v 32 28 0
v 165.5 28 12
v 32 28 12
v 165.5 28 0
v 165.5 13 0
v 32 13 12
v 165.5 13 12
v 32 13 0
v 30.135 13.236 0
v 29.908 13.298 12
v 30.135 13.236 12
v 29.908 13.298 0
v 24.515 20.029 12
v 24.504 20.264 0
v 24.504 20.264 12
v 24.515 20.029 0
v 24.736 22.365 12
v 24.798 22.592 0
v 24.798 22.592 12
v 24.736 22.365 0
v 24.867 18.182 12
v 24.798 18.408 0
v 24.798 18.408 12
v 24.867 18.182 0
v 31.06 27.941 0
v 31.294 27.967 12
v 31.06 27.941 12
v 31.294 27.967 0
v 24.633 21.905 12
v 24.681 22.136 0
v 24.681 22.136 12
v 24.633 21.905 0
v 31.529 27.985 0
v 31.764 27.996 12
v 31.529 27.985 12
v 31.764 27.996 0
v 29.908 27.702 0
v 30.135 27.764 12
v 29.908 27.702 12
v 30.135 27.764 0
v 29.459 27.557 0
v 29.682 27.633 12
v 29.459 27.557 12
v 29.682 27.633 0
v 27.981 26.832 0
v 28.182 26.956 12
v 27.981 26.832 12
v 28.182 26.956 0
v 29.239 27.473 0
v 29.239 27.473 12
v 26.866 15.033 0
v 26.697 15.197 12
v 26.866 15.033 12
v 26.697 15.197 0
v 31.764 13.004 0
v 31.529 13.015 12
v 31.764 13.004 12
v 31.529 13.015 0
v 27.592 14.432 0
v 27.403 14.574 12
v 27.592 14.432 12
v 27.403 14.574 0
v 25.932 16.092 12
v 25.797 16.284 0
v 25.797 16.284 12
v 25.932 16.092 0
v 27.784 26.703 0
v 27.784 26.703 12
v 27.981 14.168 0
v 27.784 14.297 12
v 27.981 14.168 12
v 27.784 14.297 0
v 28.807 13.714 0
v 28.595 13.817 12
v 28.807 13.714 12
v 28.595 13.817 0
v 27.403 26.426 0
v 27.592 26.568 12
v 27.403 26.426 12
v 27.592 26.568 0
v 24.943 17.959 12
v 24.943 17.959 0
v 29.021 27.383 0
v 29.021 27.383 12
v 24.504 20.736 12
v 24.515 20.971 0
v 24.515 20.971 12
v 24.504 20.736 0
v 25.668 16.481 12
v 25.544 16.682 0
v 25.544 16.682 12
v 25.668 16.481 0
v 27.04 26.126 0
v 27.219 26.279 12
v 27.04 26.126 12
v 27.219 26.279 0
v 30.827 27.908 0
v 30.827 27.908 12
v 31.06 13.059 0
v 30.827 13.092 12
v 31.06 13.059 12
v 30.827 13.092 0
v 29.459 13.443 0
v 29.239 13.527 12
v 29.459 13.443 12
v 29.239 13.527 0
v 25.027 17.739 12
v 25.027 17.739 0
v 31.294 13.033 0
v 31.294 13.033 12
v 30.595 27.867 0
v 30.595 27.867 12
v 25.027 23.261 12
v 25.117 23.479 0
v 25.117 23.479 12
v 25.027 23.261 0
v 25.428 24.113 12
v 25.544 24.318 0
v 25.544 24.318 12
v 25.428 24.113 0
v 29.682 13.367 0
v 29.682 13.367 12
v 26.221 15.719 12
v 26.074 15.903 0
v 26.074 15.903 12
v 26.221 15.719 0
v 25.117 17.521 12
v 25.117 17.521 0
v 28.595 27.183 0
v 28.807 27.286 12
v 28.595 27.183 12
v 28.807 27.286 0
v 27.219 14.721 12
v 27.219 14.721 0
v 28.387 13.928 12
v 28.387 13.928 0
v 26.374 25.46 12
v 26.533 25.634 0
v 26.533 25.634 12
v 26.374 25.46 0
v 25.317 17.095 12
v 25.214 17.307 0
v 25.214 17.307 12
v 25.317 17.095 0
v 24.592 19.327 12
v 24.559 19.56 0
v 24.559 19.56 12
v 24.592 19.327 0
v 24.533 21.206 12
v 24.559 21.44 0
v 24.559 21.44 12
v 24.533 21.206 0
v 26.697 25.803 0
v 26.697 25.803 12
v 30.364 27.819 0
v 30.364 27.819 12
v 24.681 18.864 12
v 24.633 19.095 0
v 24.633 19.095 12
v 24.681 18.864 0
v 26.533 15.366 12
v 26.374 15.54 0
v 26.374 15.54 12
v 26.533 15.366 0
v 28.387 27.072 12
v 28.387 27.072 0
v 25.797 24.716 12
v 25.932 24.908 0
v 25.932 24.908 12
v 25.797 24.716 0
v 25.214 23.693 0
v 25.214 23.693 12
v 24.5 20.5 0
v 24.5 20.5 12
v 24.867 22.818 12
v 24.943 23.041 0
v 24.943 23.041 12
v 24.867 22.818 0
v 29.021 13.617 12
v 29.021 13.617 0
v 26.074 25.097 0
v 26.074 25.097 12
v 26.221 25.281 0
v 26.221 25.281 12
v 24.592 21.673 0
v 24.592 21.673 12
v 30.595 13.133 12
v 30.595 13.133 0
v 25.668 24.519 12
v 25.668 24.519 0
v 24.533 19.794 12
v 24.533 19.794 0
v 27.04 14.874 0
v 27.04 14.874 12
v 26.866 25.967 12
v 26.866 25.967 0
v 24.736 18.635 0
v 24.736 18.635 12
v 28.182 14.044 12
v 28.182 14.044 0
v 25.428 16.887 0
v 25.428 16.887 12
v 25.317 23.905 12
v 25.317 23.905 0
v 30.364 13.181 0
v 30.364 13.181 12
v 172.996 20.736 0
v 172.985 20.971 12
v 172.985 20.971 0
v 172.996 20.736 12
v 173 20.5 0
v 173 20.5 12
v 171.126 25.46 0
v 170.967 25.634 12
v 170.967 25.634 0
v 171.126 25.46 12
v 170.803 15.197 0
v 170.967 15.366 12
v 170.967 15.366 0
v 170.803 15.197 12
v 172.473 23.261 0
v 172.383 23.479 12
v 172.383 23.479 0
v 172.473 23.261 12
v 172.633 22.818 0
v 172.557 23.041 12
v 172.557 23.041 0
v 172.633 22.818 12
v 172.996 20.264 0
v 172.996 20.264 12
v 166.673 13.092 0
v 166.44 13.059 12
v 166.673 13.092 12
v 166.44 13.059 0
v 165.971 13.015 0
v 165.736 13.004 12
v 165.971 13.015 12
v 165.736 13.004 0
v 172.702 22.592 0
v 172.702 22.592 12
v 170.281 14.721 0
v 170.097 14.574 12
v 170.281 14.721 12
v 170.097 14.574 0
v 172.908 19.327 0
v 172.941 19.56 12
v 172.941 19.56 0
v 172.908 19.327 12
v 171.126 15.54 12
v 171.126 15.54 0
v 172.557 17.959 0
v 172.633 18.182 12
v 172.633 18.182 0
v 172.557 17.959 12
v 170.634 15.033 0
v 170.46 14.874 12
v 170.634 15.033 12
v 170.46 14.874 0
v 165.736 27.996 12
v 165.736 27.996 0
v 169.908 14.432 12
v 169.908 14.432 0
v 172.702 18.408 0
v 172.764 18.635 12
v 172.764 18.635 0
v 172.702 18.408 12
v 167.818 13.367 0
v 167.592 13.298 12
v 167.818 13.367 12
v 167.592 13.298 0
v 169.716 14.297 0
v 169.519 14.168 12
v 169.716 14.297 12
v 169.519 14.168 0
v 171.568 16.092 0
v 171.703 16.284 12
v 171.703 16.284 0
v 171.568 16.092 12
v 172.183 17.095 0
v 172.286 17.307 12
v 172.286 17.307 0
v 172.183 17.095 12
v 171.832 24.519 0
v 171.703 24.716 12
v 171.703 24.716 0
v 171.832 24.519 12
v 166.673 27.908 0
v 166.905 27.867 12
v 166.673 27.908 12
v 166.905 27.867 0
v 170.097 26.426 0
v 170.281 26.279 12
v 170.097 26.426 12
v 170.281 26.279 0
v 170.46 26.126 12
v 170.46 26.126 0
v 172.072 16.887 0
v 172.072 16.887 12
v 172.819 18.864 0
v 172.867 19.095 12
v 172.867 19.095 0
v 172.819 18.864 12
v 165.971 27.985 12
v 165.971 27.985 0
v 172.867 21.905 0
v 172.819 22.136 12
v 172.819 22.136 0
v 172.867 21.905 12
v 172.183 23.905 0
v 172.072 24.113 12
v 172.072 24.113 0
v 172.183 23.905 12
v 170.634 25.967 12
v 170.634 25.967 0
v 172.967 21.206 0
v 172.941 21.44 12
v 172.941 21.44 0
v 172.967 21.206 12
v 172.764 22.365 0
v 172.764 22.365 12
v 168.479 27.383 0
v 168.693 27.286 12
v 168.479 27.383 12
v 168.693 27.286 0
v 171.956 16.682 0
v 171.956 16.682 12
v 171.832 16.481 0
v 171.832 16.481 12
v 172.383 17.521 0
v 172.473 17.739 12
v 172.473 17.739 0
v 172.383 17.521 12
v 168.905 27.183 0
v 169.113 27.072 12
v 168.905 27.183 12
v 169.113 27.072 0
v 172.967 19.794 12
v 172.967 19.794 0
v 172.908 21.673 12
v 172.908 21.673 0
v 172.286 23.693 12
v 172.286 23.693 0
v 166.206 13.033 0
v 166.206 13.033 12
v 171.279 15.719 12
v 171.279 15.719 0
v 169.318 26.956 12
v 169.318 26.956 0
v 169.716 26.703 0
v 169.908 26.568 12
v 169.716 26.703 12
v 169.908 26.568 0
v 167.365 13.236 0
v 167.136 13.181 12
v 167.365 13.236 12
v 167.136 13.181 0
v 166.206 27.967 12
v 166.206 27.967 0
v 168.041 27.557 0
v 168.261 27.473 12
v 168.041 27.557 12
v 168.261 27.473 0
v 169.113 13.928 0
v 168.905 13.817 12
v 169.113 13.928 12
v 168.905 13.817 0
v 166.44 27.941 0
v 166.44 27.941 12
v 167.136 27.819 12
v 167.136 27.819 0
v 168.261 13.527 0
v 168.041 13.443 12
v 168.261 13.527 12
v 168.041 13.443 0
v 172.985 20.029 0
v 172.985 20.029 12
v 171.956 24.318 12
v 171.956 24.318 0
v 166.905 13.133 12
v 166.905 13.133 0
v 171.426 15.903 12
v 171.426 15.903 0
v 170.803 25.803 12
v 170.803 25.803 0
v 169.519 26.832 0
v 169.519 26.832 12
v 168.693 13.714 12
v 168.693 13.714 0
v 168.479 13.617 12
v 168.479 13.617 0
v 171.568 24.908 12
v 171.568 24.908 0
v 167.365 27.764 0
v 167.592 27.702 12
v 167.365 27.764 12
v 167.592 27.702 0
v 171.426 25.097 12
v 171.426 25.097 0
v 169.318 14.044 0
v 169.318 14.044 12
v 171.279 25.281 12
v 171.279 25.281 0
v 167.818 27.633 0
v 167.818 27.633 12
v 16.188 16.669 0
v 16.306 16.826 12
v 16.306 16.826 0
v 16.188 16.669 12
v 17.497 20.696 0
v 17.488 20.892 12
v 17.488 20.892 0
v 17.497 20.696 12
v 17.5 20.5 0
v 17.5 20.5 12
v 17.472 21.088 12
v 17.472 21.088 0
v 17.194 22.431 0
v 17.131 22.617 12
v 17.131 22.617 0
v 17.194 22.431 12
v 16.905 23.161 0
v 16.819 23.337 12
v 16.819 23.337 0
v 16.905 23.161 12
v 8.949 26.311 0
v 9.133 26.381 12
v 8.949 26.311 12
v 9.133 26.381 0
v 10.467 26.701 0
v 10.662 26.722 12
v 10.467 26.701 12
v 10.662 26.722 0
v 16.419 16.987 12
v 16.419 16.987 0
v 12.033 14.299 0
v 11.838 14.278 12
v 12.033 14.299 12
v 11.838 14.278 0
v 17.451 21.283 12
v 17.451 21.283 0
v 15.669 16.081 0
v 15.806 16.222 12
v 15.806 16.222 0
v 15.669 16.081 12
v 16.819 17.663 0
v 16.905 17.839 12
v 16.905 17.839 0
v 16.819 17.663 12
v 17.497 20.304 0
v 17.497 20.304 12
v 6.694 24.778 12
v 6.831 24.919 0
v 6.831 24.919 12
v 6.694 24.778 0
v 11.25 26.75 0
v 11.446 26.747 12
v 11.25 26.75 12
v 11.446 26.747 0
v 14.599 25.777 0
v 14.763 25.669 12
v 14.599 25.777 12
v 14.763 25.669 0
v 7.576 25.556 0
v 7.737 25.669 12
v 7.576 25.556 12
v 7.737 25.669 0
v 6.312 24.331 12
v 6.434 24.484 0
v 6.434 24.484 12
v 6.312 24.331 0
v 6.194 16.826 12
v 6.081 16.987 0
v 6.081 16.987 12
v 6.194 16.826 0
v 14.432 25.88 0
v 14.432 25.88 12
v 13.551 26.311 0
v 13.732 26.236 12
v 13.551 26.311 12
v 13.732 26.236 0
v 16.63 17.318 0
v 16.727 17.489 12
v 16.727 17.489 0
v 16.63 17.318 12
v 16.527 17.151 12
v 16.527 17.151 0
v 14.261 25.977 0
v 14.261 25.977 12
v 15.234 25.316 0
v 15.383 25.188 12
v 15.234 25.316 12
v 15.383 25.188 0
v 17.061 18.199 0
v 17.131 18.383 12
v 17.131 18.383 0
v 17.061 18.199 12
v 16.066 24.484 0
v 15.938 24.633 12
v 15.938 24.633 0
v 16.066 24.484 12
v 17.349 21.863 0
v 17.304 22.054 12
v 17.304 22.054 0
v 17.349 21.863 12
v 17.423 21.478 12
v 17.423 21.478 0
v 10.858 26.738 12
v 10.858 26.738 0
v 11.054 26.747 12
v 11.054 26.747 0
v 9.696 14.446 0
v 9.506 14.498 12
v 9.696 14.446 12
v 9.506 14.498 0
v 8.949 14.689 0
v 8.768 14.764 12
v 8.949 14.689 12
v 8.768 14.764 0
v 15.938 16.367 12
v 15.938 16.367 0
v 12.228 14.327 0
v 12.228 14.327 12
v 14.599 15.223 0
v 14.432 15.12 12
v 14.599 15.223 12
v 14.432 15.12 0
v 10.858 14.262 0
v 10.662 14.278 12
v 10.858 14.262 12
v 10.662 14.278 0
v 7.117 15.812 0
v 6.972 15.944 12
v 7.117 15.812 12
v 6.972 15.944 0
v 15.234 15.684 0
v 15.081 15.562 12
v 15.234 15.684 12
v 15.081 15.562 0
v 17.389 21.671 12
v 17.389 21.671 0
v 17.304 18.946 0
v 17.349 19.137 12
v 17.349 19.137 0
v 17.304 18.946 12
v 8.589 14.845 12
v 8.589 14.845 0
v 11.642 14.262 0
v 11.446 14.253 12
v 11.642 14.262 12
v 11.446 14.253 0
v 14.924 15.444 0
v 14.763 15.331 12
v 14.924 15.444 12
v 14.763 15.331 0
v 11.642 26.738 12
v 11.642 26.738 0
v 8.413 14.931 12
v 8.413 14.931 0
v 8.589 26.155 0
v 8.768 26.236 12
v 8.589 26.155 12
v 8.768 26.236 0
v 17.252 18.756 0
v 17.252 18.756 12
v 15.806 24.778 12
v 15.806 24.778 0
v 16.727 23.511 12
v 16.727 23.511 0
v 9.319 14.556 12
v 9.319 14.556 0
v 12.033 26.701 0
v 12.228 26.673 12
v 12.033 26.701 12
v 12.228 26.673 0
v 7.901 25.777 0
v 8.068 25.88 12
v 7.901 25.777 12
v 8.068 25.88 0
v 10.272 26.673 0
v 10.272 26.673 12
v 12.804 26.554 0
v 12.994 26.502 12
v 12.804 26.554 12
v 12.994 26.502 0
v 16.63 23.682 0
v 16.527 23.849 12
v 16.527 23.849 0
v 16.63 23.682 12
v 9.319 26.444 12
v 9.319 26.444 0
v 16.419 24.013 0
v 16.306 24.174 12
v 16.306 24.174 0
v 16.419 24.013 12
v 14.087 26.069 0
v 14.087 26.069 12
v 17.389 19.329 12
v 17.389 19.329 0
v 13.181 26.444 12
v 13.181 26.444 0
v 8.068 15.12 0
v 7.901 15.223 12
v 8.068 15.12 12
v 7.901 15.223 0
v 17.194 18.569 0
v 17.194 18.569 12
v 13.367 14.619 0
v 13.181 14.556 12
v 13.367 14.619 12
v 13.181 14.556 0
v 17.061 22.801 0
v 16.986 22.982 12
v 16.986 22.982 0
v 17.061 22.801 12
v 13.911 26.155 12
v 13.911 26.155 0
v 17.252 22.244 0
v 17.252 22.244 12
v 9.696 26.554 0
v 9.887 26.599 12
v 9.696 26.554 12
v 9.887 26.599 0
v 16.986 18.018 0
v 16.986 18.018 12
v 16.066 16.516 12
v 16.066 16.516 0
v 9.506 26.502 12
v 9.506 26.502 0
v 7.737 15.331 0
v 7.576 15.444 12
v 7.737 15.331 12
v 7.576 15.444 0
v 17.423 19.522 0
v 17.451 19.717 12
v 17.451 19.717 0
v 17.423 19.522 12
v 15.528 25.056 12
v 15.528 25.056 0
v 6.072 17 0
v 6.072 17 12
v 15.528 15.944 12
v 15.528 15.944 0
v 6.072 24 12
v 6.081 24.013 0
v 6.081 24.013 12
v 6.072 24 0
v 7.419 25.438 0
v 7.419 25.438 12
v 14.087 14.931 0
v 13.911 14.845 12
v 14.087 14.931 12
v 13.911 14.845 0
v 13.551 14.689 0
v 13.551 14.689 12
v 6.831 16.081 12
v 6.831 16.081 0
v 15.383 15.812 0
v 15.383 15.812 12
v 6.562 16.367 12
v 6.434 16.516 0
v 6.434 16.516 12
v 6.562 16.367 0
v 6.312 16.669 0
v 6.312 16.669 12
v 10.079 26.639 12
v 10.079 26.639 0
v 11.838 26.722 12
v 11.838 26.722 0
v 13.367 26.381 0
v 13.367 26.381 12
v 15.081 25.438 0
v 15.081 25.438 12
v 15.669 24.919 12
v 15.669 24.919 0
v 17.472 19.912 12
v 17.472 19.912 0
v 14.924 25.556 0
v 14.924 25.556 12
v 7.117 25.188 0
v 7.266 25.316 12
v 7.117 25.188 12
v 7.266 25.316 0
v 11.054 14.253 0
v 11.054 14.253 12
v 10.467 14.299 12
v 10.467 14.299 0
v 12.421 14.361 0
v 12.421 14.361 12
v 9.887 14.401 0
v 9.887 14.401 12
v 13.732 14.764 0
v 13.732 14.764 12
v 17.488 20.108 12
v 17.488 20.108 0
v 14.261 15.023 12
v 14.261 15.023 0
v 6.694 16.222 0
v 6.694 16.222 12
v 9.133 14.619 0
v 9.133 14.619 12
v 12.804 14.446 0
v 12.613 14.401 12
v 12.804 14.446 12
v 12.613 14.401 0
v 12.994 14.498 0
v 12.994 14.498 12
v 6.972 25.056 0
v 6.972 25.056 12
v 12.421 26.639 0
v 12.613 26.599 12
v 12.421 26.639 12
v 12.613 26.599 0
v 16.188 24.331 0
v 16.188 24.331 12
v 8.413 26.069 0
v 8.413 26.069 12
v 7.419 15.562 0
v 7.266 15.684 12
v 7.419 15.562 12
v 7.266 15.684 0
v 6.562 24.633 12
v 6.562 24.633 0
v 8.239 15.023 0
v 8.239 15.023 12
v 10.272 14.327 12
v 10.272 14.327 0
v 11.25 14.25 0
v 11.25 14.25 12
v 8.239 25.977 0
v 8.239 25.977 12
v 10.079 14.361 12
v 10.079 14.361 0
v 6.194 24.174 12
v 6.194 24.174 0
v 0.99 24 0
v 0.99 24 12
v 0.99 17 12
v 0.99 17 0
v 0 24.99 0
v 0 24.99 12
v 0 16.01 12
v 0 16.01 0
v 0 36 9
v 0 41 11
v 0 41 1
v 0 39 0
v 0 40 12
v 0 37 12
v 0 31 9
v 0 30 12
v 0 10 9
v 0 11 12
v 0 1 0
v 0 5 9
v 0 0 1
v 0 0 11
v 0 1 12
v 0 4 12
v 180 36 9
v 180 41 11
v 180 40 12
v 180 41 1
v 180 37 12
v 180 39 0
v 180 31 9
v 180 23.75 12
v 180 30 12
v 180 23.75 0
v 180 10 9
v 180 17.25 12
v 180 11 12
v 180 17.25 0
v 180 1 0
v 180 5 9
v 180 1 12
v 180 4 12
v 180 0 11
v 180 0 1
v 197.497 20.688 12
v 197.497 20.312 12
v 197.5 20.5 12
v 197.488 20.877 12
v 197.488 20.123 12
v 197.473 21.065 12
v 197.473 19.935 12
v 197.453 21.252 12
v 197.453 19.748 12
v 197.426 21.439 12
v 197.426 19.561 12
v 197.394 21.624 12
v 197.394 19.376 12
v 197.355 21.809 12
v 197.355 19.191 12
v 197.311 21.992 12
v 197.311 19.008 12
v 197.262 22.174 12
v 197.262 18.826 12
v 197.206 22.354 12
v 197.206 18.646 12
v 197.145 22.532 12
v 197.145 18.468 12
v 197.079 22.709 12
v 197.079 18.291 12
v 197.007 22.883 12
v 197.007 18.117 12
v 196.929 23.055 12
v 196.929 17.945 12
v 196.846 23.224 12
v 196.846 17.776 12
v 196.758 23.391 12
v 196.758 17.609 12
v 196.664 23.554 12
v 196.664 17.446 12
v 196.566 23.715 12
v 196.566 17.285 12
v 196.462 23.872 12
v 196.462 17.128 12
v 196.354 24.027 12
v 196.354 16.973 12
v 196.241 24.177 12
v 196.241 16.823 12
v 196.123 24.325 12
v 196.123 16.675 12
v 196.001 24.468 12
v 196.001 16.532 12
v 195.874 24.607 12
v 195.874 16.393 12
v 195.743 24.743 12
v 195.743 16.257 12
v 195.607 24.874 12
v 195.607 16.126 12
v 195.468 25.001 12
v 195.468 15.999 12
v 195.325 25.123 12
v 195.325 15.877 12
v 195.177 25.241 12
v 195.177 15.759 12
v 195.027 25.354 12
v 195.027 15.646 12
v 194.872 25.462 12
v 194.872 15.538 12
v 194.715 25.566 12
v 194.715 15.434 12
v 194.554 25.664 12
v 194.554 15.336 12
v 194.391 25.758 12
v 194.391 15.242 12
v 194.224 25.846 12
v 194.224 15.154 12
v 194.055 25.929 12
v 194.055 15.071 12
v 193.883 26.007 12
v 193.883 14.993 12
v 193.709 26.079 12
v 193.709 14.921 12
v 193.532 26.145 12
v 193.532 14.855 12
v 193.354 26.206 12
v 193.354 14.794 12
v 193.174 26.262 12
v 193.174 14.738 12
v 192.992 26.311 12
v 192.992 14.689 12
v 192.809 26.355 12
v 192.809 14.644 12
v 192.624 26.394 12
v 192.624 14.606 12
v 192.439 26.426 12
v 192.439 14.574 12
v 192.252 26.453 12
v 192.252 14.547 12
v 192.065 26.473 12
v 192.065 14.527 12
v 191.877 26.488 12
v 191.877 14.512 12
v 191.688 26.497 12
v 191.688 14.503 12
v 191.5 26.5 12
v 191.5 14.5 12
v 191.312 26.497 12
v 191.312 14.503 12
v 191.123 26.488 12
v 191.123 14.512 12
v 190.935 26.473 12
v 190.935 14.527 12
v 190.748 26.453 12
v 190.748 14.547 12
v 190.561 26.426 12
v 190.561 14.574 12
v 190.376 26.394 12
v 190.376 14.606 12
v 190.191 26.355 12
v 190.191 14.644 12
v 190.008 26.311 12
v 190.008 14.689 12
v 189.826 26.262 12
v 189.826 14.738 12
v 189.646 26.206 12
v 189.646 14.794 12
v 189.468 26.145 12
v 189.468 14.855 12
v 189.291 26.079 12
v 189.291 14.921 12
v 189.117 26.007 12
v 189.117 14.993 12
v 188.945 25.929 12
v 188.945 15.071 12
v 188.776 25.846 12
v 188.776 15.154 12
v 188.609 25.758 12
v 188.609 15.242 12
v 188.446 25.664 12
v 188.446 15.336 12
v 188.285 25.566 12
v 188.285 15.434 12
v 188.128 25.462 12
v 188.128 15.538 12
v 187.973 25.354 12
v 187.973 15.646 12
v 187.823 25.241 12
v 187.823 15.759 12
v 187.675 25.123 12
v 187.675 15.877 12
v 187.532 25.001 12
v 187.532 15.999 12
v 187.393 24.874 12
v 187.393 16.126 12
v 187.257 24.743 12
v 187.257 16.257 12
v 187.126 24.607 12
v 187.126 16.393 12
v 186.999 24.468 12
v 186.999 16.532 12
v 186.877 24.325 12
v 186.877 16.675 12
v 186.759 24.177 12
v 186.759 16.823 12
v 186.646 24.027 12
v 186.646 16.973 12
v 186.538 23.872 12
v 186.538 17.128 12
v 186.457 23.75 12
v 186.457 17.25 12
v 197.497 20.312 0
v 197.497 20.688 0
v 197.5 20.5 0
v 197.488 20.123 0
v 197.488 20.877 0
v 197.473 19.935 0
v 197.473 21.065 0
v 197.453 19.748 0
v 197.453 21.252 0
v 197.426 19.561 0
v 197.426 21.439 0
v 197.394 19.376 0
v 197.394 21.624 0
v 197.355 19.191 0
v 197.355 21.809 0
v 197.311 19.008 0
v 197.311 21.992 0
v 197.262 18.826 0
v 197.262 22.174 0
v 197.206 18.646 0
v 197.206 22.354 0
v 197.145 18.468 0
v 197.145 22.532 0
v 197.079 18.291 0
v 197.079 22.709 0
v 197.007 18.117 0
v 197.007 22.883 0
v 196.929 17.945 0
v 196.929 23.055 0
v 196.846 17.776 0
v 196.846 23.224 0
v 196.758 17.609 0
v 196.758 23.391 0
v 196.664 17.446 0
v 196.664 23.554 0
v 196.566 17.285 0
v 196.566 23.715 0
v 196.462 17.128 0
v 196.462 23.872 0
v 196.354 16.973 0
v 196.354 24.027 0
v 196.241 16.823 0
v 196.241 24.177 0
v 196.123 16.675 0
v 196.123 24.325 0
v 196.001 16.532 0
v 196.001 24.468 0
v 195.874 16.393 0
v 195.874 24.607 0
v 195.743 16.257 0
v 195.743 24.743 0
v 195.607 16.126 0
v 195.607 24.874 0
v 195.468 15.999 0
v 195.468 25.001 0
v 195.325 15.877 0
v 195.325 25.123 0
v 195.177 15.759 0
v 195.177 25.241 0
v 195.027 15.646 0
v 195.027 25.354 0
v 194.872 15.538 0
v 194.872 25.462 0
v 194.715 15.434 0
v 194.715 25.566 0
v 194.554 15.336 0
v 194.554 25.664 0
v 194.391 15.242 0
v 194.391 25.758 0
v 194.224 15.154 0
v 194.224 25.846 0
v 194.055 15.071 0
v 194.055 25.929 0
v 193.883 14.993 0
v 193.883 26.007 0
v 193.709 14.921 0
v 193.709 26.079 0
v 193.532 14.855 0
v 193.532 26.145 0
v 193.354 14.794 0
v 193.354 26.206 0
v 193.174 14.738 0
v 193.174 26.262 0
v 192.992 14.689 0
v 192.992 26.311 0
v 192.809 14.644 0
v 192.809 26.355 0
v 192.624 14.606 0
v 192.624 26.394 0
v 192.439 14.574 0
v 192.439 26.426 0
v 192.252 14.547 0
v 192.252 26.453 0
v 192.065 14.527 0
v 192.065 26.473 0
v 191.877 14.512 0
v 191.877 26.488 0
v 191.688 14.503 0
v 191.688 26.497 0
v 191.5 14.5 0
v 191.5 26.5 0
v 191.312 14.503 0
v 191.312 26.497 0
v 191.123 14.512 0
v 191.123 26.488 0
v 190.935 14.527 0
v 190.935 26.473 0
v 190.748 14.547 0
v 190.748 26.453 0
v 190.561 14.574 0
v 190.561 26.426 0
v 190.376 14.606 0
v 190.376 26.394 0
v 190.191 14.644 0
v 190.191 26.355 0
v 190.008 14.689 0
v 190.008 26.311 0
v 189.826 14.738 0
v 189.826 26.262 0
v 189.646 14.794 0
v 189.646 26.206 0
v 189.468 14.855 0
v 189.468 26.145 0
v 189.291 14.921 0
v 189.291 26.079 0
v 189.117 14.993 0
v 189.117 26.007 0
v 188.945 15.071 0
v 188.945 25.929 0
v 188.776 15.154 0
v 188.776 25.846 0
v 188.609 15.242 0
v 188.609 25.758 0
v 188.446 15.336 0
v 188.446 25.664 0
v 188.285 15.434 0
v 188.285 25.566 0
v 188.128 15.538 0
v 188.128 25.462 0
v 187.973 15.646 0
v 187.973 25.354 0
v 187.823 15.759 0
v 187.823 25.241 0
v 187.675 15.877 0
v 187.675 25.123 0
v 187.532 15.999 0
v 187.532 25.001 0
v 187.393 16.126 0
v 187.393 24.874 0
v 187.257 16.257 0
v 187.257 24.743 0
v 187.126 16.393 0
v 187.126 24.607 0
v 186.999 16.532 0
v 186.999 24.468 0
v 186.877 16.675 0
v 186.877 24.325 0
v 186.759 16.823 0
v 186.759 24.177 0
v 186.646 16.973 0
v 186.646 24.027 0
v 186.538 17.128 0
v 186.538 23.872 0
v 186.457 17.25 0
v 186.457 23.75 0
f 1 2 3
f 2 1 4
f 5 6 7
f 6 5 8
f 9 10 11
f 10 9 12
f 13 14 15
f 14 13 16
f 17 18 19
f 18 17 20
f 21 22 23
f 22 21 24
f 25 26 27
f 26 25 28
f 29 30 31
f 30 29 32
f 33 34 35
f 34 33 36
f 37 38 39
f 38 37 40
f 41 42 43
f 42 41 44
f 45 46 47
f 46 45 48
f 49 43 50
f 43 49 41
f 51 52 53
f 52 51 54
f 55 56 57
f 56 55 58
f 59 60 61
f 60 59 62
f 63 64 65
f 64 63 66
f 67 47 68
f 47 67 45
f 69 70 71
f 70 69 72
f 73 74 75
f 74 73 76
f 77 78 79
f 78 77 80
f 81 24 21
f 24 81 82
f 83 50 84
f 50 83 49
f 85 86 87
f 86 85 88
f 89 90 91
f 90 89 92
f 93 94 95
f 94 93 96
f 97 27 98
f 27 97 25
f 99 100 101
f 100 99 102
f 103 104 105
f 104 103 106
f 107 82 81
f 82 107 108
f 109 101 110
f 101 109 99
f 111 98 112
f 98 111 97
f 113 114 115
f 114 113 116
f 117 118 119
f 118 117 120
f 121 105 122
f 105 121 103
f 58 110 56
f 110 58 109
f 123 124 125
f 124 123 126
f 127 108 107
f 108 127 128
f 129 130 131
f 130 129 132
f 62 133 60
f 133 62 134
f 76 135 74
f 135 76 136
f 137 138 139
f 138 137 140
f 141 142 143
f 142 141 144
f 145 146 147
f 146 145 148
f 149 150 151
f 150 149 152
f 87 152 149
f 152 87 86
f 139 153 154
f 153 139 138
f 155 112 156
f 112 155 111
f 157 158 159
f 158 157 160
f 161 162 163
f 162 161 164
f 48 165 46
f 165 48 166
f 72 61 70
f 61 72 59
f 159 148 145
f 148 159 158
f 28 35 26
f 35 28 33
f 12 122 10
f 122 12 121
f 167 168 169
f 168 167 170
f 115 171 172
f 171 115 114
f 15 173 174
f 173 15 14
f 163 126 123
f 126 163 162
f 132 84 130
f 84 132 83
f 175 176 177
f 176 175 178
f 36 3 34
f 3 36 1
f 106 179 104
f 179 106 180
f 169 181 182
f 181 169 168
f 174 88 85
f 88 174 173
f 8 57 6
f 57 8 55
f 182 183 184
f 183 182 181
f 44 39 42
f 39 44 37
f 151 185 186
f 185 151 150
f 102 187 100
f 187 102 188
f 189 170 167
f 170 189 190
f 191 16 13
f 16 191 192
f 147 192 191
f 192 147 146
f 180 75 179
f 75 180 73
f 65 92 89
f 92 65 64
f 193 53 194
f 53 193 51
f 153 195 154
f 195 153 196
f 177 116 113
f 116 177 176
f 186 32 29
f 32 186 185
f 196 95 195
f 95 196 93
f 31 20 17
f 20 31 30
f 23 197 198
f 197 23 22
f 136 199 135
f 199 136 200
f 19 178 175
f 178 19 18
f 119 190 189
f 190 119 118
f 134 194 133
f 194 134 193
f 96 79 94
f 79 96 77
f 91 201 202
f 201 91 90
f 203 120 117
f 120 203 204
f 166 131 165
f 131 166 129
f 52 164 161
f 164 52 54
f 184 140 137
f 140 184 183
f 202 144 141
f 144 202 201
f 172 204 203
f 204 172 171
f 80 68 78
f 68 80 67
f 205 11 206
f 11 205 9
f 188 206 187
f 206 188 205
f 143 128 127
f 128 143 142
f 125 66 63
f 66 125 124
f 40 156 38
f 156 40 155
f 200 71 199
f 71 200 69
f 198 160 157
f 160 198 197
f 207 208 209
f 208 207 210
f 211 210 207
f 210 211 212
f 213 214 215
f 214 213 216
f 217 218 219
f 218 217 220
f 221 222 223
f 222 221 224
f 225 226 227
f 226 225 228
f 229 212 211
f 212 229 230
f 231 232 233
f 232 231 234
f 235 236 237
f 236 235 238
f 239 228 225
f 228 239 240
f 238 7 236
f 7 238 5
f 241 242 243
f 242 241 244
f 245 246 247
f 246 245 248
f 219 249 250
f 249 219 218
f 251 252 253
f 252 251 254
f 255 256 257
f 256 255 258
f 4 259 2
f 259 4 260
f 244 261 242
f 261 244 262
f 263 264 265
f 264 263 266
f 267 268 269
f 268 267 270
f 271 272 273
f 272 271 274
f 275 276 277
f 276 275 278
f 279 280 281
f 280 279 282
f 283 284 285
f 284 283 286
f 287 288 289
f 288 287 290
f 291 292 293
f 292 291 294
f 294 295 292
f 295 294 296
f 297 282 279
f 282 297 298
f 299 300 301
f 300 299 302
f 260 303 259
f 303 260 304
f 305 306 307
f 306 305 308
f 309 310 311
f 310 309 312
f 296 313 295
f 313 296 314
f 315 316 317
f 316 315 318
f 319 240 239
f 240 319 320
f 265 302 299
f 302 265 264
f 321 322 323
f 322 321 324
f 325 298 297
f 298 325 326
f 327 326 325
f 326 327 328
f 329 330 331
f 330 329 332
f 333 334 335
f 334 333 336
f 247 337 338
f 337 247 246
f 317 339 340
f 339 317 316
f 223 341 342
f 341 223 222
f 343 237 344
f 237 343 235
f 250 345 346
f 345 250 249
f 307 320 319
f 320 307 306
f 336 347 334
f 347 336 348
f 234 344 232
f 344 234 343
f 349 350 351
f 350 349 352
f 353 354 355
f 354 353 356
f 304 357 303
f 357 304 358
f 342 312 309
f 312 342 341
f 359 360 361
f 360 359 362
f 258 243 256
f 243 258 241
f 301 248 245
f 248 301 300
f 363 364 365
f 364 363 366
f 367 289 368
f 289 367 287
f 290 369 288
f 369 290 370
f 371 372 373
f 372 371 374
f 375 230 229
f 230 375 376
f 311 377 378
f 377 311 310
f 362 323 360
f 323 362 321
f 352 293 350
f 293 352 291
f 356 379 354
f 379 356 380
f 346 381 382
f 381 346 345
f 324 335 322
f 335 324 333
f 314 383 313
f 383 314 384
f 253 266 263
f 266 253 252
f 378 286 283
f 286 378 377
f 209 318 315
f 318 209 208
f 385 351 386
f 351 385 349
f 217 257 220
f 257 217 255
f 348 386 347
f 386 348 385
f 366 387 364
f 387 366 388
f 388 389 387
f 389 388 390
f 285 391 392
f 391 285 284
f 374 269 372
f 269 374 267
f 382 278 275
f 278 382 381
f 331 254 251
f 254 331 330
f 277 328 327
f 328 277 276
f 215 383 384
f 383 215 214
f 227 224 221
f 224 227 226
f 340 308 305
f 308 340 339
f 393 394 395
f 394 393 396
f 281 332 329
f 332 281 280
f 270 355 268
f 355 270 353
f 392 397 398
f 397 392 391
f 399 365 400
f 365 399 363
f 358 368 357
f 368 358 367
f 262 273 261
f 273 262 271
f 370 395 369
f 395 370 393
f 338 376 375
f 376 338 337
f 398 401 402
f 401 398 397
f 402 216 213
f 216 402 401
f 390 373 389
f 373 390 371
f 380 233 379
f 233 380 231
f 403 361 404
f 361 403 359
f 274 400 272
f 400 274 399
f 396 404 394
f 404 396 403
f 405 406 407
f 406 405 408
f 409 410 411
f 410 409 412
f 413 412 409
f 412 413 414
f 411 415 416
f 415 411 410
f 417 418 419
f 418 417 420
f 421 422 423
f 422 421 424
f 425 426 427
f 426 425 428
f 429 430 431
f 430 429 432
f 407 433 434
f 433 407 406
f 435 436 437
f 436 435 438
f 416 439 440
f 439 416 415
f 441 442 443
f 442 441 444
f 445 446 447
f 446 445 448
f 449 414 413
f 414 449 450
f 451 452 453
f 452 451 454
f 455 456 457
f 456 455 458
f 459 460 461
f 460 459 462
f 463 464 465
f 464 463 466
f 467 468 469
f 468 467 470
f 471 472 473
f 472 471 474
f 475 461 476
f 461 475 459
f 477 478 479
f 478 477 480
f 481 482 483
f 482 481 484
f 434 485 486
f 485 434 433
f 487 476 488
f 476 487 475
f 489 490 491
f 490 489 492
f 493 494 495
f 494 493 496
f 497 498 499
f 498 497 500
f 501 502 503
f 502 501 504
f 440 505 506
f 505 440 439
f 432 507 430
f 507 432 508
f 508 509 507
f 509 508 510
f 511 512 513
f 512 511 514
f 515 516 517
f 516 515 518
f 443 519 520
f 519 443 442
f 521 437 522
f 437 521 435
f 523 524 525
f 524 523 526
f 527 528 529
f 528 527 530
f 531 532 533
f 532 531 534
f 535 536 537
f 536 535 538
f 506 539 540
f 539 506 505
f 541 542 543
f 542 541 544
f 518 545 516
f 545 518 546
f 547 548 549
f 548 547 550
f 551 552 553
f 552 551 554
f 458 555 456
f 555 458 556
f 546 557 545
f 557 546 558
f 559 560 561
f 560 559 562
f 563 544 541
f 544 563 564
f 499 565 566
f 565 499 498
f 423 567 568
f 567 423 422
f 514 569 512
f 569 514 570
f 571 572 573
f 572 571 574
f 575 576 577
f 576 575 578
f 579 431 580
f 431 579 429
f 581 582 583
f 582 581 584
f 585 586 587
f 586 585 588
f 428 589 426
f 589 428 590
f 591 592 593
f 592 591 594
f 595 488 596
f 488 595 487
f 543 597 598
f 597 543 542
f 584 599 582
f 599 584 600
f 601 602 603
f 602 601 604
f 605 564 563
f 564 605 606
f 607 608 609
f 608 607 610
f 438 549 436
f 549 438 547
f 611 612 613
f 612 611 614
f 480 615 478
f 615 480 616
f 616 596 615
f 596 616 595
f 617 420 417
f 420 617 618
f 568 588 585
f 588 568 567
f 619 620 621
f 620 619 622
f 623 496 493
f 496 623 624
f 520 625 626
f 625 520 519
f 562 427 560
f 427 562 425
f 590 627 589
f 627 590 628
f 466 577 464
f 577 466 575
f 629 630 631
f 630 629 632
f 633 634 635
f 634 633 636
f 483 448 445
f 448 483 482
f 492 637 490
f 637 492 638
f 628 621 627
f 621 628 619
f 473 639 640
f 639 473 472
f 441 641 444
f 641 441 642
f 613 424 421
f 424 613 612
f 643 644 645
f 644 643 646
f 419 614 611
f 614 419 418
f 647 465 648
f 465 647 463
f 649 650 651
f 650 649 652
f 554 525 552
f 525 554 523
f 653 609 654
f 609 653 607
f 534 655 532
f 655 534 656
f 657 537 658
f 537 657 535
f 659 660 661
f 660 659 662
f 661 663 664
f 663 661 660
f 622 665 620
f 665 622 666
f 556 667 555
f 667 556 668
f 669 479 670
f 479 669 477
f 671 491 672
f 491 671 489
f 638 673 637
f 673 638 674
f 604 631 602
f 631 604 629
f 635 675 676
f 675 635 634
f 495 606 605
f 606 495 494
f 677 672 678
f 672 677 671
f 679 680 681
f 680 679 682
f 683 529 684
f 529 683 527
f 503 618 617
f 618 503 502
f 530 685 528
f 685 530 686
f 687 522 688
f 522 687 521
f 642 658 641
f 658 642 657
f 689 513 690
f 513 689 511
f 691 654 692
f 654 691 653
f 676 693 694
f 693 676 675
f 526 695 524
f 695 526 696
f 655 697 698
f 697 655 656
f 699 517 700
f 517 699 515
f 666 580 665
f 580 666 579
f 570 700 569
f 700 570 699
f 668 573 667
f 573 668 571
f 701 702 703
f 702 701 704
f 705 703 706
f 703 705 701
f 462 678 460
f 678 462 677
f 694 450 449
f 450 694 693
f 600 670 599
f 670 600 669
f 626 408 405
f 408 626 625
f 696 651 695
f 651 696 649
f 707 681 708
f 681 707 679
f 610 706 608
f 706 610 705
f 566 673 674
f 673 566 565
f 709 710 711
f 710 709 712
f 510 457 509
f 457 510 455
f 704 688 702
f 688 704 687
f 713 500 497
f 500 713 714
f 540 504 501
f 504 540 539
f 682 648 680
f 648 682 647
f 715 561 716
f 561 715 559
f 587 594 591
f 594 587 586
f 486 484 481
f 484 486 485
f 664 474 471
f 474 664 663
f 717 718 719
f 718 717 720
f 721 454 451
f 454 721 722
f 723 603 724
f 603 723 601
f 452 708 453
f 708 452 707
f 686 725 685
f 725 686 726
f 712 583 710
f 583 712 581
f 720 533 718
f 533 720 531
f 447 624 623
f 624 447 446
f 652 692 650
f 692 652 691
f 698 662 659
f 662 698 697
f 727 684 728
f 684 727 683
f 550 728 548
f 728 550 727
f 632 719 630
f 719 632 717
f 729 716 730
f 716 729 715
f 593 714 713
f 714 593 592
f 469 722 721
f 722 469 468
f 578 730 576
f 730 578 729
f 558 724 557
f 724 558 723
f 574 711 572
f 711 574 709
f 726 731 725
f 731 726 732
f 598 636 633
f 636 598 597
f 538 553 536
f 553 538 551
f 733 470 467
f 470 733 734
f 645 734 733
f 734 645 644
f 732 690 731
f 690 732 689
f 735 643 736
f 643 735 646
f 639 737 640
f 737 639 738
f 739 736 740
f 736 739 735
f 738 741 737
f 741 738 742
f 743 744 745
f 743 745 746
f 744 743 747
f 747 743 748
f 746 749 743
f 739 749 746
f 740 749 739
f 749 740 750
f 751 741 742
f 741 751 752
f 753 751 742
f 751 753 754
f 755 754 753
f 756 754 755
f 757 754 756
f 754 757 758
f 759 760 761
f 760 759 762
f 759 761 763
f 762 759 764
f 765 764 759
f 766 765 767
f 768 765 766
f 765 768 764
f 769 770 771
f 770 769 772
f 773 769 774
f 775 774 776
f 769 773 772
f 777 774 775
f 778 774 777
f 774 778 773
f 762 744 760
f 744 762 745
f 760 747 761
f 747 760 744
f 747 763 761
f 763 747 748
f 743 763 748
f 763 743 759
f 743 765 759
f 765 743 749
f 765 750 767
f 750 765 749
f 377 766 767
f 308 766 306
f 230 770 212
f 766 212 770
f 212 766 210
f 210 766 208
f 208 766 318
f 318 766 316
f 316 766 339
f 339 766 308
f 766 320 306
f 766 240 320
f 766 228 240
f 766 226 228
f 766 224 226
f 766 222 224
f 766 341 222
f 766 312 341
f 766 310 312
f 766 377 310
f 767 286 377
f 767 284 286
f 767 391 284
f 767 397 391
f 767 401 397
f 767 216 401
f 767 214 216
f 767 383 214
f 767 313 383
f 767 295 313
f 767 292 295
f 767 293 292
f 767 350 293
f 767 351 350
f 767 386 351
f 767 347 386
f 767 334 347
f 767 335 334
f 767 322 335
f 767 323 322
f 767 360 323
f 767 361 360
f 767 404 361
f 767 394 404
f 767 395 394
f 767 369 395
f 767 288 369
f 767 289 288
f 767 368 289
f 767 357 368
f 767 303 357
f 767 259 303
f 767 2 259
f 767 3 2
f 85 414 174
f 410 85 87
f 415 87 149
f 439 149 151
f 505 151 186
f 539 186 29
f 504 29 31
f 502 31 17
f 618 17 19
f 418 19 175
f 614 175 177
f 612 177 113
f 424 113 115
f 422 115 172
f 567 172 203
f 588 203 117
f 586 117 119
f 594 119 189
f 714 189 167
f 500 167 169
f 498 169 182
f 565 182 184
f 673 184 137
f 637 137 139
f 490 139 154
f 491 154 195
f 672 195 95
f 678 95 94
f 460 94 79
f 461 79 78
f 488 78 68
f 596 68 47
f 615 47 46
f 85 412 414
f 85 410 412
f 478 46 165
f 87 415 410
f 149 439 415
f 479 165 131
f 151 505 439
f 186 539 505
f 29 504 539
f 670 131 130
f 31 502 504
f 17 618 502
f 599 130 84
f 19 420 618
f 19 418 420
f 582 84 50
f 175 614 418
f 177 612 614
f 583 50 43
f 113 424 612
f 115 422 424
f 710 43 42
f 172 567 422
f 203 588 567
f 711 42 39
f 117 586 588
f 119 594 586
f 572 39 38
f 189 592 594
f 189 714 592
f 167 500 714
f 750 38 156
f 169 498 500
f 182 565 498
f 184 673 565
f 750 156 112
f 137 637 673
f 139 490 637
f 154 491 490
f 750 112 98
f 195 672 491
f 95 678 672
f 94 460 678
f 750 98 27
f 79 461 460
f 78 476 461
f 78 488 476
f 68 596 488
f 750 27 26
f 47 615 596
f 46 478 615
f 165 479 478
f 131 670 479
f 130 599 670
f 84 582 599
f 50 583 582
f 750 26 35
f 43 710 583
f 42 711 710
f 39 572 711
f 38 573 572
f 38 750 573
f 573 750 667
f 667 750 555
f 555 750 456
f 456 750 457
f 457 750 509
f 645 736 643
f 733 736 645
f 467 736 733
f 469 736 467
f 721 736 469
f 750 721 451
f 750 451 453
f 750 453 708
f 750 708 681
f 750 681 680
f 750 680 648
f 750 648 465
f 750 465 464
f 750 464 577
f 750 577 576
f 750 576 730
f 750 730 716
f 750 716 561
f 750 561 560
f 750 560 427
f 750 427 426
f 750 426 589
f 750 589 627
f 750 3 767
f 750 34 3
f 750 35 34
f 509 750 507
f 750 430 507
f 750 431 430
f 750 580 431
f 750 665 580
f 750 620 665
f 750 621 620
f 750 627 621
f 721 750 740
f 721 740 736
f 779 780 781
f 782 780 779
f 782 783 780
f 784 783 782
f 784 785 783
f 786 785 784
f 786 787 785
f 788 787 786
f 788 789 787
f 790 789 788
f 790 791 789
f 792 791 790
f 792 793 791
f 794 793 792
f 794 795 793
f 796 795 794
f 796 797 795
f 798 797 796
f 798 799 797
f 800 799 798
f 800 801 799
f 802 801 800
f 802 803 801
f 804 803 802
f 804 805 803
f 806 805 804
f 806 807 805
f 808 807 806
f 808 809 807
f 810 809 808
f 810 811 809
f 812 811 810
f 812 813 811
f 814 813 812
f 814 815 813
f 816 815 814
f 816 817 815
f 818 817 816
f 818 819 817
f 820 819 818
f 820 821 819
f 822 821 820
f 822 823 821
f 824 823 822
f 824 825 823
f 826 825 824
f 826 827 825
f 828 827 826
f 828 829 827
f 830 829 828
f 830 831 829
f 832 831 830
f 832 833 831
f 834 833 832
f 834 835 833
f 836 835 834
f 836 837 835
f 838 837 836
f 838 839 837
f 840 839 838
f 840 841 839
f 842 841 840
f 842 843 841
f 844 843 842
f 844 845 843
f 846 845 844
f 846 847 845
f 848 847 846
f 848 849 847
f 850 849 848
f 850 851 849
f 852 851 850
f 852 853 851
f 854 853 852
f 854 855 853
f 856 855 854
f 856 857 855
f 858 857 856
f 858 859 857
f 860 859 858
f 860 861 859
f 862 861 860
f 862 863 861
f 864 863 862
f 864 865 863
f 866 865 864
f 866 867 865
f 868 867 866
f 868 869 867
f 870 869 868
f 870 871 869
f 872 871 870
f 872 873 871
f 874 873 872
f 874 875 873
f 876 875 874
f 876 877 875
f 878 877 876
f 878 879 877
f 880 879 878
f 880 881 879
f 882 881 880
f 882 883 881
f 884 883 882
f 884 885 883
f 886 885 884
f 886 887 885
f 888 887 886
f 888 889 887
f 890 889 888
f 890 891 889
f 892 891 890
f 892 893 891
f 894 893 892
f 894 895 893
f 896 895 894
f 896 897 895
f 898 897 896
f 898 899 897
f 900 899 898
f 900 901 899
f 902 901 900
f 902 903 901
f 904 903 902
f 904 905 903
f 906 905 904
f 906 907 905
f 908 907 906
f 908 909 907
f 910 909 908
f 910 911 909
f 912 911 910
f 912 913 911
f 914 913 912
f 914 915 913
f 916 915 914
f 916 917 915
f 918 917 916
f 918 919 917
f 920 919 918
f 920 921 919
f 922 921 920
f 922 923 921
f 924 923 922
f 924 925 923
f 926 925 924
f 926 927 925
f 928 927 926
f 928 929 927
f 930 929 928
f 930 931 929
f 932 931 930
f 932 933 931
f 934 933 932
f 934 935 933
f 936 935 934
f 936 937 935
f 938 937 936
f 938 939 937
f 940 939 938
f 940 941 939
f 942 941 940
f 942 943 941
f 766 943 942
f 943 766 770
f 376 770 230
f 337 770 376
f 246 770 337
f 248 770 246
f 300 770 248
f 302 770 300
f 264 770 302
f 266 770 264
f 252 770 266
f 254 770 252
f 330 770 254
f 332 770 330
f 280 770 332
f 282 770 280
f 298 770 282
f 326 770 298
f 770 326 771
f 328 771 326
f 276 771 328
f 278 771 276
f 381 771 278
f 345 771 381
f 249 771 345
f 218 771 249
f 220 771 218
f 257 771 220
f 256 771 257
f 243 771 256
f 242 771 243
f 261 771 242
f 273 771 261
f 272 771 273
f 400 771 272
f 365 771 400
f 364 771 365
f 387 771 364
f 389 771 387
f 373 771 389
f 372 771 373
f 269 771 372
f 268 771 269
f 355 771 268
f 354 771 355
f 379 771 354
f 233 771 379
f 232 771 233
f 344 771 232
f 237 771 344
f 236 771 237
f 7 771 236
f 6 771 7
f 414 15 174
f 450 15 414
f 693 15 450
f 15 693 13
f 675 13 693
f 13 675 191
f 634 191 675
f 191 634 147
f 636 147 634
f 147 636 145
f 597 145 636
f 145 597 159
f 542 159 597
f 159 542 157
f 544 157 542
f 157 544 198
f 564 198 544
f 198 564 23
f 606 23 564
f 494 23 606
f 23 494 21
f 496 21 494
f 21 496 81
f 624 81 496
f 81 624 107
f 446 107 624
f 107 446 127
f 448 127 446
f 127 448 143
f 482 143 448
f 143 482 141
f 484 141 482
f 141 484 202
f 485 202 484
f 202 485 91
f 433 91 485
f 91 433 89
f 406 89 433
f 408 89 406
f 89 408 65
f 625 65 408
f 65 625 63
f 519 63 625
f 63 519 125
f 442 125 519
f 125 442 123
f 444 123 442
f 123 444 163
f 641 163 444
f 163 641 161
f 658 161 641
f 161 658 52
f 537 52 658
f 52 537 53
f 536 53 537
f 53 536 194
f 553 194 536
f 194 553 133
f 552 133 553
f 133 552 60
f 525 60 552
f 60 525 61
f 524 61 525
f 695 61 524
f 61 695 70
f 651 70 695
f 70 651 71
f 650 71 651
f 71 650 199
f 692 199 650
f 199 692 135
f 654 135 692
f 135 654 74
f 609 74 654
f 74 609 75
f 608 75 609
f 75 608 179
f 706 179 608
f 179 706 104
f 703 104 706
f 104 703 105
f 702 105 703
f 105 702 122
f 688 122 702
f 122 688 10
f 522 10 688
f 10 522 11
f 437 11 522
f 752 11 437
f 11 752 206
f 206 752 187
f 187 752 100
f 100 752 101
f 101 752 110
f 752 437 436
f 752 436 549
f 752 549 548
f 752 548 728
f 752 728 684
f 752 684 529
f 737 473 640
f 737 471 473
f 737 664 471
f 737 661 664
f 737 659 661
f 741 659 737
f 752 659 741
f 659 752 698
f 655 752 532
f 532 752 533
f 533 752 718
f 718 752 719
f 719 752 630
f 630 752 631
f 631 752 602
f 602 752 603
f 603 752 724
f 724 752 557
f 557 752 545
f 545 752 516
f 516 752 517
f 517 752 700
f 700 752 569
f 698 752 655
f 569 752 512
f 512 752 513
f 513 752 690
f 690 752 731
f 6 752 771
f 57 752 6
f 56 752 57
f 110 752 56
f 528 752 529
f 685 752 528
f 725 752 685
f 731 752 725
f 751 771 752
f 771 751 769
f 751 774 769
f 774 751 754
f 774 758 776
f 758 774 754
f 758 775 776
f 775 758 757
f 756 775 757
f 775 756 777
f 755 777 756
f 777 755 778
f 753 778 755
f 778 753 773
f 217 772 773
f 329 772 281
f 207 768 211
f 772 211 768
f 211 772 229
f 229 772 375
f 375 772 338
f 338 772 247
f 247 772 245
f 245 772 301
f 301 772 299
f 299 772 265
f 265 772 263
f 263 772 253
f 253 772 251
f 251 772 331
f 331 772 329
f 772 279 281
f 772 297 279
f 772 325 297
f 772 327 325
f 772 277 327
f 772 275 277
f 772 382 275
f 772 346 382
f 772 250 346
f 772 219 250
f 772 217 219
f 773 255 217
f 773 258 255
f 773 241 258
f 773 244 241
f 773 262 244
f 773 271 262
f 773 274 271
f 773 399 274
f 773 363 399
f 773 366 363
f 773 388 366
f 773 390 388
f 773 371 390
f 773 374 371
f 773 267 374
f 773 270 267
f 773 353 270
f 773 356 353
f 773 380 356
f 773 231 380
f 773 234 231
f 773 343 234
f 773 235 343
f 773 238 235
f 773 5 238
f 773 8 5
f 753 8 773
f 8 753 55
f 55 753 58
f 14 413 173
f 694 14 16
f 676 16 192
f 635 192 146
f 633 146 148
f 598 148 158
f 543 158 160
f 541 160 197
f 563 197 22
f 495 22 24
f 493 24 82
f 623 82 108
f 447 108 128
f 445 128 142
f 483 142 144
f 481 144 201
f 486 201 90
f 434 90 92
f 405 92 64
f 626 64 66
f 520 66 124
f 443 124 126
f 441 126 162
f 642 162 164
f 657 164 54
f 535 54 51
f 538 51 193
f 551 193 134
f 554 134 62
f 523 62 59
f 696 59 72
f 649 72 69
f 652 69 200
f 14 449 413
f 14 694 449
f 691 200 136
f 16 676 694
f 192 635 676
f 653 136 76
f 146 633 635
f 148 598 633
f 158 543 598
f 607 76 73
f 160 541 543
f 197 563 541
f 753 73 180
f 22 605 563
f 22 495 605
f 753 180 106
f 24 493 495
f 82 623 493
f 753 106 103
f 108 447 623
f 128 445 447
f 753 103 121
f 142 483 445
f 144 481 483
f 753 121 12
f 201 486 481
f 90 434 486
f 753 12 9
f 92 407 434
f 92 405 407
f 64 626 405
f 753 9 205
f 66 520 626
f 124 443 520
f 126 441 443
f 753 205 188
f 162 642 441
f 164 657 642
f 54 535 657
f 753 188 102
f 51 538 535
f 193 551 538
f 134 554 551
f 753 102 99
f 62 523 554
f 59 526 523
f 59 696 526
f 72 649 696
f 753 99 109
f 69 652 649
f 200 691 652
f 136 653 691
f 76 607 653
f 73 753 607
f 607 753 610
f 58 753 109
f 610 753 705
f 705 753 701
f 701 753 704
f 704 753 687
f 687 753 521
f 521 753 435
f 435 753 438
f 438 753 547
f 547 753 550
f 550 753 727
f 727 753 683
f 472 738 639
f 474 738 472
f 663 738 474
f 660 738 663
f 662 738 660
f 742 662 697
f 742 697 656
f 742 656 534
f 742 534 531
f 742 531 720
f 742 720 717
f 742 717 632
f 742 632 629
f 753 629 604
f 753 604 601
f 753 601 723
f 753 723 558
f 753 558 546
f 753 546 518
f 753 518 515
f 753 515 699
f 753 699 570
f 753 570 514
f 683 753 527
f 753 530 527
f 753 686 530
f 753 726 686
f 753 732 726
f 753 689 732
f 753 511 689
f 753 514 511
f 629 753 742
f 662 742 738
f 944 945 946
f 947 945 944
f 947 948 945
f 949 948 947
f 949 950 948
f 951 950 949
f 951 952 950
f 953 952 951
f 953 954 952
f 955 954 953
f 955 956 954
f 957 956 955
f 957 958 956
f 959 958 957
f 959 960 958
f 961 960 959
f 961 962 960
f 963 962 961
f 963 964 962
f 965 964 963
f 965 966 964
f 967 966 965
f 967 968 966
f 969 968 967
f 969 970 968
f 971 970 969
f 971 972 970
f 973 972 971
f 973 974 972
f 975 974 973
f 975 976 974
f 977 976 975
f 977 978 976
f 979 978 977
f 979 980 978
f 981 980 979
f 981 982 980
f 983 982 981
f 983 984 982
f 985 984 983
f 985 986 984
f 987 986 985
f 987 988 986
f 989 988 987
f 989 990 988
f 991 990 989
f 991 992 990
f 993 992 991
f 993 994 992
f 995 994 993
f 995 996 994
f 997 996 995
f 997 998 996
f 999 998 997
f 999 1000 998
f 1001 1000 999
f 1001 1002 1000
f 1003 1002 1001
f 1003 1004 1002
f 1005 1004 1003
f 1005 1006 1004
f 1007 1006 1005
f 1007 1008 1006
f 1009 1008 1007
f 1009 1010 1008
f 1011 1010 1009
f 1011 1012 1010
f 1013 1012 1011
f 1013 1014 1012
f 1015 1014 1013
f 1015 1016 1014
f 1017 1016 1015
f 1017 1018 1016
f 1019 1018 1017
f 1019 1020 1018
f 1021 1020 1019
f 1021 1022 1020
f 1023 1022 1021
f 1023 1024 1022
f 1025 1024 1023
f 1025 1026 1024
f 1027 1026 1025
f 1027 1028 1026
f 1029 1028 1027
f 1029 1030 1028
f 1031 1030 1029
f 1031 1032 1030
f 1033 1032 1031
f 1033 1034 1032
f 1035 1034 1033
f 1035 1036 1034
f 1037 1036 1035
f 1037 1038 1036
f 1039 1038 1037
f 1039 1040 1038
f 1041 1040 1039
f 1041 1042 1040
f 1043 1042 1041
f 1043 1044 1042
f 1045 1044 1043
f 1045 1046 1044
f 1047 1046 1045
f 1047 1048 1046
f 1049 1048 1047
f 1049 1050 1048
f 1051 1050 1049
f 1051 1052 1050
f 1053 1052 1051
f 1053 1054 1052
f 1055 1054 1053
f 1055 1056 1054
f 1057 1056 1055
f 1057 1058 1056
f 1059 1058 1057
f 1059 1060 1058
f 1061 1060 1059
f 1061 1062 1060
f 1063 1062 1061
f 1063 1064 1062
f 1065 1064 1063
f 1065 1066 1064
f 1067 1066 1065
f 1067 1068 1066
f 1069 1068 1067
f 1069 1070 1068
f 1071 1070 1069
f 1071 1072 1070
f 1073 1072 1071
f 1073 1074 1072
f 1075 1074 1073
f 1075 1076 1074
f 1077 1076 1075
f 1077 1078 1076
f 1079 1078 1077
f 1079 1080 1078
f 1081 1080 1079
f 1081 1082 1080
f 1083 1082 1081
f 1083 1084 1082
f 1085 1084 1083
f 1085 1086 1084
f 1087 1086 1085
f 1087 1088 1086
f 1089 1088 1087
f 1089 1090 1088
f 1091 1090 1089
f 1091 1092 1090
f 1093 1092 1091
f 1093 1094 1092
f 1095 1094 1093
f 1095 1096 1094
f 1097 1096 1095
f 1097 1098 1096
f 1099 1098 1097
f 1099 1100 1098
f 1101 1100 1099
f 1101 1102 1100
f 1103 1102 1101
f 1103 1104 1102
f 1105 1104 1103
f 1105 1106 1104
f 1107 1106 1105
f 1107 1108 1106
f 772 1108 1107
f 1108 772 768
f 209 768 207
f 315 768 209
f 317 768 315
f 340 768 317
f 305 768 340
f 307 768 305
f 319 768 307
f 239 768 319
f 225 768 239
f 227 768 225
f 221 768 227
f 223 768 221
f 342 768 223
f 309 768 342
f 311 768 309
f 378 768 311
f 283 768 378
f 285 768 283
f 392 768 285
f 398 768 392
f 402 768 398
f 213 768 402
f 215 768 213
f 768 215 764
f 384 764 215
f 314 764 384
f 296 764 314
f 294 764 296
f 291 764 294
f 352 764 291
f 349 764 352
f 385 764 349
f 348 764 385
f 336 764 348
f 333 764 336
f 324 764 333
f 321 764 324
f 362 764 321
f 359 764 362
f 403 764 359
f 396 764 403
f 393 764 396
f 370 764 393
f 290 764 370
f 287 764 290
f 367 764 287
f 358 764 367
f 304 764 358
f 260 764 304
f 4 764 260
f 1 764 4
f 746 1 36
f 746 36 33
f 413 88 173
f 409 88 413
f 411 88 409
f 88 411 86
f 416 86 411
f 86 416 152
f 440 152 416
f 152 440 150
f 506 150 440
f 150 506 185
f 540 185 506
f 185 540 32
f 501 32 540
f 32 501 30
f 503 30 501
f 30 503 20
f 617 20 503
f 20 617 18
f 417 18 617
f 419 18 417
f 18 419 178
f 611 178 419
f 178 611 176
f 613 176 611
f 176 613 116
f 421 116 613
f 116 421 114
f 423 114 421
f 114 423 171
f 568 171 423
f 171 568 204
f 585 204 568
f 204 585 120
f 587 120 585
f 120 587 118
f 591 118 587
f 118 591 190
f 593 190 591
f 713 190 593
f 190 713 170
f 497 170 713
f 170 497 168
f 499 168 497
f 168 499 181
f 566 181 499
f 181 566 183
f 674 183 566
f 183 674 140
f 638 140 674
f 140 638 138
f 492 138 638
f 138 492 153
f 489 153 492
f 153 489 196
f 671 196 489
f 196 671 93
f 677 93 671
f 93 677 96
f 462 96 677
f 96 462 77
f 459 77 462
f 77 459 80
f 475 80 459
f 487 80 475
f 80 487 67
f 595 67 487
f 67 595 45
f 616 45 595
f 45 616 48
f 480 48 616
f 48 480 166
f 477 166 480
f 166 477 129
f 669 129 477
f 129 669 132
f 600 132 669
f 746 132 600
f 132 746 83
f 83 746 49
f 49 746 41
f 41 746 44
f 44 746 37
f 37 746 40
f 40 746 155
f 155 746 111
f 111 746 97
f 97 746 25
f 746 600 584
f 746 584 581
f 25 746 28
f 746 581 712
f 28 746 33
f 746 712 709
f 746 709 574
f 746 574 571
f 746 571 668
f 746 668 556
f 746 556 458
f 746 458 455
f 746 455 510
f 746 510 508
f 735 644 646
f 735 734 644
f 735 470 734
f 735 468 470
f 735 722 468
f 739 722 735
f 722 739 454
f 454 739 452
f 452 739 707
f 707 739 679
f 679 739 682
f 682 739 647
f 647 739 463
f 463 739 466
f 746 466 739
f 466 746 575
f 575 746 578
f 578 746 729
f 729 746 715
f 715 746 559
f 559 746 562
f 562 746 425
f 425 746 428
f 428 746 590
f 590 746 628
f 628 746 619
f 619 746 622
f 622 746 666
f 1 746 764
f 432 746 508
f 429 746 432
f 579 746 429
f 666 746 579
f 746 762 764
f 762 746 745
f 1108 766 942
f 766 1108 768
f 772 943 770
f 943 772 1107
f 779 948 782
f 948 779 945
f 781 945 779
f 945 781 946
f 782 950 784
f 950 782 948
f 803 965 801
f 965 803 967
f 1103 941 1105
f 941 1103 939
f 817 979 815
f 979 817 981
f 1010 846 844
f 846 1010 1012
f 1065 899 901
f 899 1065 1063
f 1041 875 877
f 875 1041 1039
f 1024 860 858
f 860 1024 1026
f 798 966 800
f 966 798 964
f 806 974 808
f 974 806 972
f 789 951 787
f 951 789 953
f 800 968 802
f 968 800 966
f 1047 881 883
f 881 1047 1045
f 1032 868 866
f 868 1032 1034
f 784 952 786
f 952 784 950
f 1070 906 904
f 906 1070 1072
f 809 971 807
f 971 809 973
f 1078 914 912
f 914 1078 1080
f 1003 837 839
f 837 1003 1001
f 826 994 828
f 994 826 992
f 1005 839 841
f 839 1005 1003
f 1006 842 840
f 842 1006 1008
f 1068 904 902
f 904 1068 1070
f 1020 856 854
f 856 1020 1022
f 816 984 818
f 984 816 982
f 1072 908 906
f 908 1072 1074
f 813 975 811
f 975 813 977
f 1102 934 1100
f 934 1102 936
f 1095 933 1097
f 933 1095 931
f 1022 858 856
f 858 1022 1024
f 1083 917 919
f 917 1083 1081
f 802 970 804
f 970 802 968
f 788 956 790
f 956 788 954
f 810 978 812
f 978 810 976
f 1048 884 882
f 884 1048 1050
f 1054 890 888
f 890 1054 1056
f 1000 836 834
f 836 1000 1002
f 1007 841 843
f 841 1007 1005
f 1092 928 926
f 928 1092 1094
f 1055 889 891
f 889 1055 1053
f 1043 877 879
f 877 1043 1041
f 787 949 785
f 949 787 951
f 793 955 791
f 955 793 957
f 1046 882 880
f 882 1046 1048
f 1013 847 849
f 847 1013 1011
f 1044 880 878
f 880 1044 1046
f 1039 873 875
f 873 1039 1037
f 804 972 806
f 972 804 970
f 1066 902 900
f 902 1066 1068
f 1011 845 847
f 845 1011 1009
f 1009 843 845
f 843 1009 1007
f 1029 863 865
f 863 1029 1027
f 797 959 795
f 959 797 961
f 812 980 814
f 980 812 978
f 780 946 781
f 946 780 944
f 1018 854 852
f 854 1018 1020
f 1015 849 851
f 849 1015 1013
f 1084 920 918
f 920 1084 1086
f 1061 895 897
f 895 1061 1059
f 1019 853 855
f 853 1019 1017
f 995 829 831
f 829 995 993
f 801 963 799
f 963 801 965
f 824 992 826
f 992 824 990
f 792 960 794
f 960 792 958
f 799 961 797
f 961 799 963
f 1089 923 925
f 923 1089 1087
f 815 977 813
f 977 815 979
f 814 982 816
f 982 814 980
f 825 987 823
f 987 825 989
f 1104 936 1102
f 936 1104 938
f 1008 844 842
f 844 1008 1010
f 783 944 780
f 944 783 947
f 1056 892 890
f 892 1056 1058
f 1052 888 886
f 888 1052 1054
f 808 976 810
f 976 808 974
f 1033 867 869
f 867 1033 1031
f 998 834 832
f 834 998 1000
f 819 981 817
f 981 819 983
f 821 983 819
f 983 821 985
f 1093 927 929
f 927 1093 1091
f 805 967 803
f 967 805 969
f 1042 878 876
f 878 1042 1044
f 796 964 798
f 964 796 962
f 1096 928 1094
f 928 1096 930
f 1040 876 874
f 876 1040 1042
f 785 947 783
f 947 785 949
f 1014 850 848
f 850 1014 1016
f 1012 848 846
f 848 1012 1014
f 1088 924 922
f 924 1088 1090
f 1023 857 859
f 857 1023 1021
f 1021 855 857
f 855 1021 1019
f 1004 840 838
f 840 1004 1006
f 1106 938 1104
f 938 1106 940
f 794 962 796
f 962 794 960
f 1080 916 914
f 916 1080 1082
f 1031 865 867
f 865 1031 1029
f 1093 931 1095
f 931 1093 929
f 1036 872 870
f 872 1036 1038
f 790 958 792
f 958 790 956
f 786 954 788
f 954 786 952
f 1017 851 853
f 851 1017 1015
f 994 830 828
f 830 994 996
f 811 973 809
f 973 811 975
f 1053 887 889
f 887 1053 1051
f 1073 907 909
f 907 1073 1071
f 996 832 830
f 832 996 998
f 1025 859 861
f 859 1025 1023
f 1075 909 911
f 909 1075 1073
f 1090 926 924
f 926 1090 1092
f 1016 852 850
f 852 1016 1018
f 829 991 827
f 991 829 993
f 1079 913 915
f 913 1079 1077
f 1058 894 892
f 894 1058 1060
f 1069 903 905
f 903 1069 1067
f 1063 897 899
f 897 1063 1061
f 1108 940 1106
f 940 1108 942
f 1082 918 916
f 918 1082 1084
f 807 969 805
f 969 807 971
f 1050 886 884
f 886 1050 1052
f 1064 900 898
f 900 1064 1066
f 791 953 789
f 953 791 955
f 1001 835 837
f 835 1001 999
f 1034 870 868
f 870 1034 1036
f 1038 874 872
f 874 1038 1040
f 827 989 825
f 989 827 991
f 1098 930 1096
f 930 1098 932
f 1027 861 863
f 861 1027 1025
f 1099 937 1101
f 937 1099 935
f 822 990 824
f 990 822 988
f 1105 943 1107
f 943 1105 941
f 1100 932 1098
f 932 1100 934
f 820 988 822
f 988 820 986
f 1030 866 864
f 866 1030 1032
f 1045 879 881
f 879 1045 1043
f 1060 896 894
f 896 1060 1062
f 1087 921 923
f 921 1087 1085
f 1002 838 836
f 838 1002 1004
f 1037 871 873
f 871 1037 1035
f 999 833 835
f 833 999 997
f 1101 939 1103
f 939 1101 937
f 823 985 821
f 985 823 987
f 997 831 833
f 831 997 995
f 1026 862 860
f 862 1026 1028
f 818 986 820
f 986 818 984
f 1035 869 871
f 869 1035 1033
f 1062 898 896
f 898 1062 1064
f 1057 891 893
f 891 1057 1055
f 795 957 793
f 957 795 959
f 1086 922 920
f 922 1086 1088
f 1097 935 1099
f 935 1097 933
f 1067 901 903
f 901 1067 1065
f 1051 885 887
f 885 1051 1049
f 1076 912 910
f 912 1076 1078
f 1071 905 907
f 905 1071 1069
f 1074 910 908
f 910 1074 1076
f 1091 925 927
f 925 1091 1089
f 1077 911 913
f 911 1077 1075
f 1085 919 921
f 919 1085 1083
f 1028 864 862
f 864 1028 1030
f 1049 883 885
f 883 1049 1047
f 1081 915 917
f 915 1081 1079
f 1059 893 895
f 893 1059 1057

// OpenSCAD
// The length of the rails
length = 180; // [30:400]

// Is the hole in the center needed or not
make_hole = "yes"; // [yes, no]

/* [Hidden] */

$fn = 200;
almost_zero = 0.01;

R = 12.5 / 2;
r = 12 / 2;

W = 41;
H = 12;

c_y = 15;
c_offset = 7;

module profile() {
    polygon(
        points=[
            [0, 1],
            [0, 11],
            [1, H],
            [4, H],
            [5, 9],
            [10, 9],
            [11, H],
            [30, H],
            [31, 9],
            [36, 9],
            [37, H],
            [40, H],
            [W, 11],
            [W, 1],
            [39, 0],
            [1, 0],
        ]
    );
}

module road_body(l) {
    rotate(v=[0, 0, 1], a=90) {
        rotate(v=[1, 0, 0], a=90) {
            linear_extrude(height = l) {
                profile();
            }
        }
    }
}

module mf_road(l) {
    difference() {
        road_body(l);
        union() {
            translate([R + 5, W / 2, -almost_zero / 2]) {
                cylinder(r=R, h=H + almost_zero);
            }
            translate([-almost_zero / 2, W / 2 - 7 / 2, -almost_zero / 2]) {
                cube([7, 7, H + almost_zero]);
            }
            translate([-almost_zero, W / 2 - 9 / 2, -almost_zero / 2]) {
                linear_extrude(height=H + almost_zero) {
                    polygon(
                        points=[
                            [0, 0],
                            [2, 2],
                            [2, 7],
                            [0, 9]
                        ]
                    );
                }
            }
            if (l >= 55 && make_hole == "yes") {
                translate([5 + 2 * R + c_offset + c_y/2, (W - c_y) / 2, -almost_zero / 2]) {
                    cube([l - 5 - 2 * R - 2 * c_offset - c_y, c_y, H + almost_zero]);
                }
                translate([5 + 2 * R + c_offset + c_y/2, W/2, -almost_zero / 2]) {
                    cylinder(r=c_y/2, h=H+almost_zero);
                }
                translate([l - c_y/2 - c_offset, W/2, -almost_zero / 2]) {
                    cylinder(r=c_y/2, h=H+almost_zero);
                }
            }
        }
    }
    union() {
        translate([l, W / 2, 0]) {
            translate([0, -6.5/2, 0]) cube([7, 6.5, H]);
            translate([5.5 + r, 0, 0]) cylinder(r=r, h=H);
        }
    }
}

mf_road(length);
